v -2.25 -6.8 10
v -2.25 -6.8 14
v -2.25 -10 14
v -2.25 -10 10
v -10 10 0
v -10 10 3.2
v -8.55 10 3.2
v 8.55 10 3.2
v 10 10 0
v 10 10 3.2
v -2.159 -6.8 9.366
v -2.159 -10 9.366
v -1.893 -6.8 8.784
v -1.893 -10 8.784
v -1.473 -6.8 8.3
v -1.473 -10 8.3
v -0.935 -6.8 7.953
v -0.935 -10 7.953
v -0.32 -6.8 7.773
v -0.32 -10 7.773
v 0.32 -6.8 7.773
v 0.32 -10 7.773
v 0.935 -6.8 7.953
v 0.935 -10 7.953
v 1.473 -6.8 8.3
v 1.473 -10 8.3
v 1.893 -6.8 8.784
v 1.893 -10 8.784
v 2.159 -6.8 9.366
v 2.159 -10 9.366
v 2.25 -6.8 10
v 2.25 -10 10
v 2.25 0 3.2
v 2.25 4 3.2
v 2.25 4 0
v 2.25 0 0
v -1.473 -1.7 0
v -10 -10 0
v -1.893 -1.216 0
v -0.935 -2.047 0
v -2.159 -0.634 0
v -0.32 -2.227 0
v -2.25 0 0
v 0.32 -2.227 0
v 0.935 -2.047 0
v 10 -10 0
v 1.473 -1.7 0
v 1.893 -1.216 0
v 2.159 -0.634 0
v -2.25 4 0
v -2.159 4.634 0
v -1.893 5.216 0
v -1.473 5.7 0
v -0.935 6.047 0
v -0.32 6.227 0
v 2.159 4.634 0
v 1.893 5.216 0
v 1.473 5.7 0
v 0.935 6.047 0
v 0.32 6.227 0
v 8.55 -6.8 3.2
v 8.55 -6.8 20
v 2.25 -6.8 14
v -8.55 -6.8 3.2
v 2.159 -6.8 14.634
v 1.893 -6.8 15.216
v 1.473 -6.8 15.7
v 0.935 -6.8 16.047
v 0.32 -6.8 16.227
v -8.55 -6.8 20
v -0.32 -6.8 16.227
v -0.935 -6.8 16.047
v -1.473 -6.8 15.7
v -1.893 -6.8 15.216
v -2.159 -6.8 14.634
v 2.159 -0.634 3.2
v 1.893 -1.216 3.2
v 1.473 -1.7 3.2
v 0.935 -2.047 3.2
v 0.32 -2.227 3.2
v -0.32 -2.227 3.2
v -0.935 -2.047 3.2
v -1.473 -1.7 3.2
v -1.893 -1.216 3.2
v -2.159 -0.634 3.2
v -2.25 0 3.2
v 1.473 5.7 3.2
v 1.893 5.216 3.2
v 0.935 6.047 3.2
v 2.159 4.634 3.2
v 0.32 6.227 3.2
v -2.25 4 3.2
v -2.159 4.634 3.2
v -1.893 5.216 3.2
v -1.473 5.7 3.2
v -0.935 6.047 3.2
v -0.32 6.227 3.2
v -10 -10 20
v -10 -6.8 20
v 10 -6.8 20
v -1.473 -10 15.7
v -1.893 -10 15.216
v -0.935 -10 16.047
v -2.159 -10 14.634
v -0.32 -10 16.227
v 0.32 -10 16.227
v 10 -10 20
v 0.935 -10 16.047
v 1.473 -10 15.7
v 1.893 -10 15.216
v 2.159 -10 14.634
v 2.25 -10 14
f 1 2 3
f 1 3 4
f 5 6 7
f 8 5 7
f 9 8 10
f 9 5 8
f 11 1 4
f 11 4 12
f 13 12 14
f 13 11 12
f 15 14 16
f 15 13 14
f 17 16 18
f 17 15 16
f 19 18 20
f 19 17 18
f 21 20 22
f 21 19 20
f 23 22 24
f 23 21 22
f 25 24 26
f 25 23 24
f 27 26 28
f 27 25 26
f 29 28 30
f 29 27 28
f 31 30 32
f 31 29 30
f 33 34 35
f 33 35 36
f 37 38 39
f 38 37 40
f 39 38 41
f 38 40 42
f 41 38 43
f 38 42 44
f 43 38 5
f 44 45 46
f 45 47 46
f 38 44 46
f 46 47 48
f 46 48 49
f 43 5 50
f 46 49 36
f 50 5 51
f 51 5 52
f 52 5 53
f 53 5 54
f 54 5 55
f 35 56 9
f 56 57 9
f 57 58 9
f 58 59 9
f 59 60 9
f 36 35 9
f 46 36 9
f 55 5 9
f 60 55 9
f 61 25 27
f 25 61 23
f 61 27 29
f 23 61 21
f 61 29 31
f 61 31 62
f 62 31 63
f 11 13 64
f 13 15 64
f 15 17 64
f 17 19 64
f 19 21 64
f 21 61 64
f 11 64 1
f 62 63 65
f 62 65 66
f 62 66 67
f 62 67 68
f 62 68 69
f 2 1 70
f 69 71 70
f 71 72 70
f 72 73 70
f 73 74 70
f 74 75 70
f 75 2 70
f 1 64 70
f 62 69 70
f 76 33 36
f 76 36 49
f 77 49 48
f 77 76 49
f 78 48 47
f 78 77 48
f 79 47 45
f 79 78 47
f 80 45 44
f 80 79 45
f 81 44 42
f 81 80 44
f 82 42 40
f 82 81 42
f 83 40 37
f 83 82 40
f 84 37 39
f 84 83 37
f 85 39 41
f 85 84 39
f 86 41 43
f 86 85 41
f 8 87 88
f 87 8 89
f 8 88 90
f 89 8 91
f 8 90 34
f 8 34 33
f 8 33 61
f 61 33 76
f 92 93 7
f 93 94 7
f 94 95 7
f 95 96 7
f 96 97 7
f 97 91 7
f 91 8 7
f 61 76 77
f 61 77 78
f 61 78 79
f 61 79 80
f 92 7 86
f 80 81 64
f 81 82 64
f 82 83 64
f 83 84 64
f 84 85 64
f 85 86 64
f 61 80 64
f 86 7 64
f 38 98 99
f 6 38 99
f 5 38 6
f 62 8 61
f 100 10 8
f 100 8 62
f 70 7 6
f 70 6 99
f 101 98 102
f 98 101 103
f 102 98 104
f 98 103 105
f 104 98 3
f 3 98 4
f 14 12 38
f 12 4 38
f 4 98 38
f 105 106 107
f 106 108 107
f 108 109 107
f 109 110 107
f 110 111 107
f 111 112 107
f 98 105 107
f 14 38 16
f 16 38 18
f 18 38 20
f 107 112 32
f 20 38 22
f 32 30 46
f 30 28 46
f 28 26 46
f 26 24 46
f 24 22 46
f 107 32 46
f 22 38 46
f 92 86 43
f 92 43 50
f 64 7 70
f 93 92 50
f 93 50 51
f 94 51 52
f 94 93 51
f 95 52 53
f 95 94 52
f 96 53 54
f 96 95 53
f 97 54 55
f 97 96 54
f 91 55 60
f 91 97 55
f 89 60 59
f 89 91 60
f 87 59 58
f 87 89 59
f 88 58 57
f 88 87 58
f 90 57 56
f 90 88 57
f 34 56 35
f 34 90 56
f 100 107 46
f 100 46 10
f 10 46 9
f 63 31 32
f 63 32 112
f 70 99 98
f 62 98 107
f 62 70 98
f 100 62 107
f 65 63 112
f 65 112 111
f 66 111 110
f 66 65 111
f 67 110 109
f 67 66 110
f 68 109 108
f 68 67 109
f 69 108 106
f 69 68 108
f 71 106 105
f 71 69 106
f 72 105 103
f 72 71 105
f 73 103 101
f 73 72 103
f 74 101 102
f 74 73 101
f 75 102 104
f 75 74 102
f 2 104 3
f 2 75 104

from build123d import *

# Parameters (mm, degrees)
SKETCH1_W           = 20
SKETCH1_H           = 20
BOSS_EXTRUDE1_DEPTH = 20
CUT_EXTRUDE2_DEPTH  = 28
CUT_EXTRUDE3_DEPTH  = 8.55
CUT_EXTRUDE4_DEPTH  = 17.1
CUT_EXTRUDE5_DEPTH  = 17.1


with BuildPart() as part:
    # Sketch1 → Boss-Extrude1 (new body)
    with BuildSketch(Plane.XY):
        Rectangle(SKETCH1_W, SKETCH1_H)
    extrude(amount=BOSS_EXTRUDE1_DEPTH)

    # Sketch3 → Cut-Extrude2 (cut)
    with BuildSketch(Plane(origin=(10, 0, 0), x_dir=(0, 0, -1), z_dir=(1, 0, 0))):
        Polygon((-3.2, 10), (-20, -6.8), (-20, 10), align=None)
    extrude(amount=-CUT_EXTRUDE2_DEPTH, mode=Mode.SUBTRACT)

    # Sketch6 → Cut-Extrude3 (cut, symmetric)
    with BuildSketch(Plane.ZY):
        Polygon((3.2, 10), (3.2, -6.8), (20, -6.8), align=None)
    extrude(amount=CUT_EXTRUDE3_DEPTH, both=True, mode=Mode.SUBTRACT)

    # Sketch7 → Cut-Extrude4 (cut)
    with BuildSketch(Plane.XY.offset(3.2)):
        with BuildLine():
            Line((-2.25, 0), (-2.25, 4))
            ThreePointArc((-2.25, 4), (0, 6.25), (2.25, 4))
            Line((2.25, 4), (2.25, 0))
            ThreePointArc((2.25, 0), (0, -2.25), (-2.25, 0))
        make_face()
    extrude(amount=-CUT_EXTRUDE4_DEPTH, mode=Mode.SUBTRACT)

    # Sketch9 → Cut-Extrude5 (cut)
    with BuildSketch(Plane(origin=(0, -6.8, 0), x_dir=(1, 0, 0), z_dir=(0, 1, 0))):
        with BuildLine():
            Line((2.25, -10), (2.25, -14))
            ThreePointArc((2.25, -14), (0, -16.25), (-2.25, -14))
            Line((-2.25, -14), (-2.25, -10))
            ThreePointArc((-2.25, -10), (0, -7.75), (2.25, -10))
        make_face()
    extrude(amount=-CUT_EXTRUDE5_DEPTH, mode=Mode.SUBTRACT)


solid = part.part
